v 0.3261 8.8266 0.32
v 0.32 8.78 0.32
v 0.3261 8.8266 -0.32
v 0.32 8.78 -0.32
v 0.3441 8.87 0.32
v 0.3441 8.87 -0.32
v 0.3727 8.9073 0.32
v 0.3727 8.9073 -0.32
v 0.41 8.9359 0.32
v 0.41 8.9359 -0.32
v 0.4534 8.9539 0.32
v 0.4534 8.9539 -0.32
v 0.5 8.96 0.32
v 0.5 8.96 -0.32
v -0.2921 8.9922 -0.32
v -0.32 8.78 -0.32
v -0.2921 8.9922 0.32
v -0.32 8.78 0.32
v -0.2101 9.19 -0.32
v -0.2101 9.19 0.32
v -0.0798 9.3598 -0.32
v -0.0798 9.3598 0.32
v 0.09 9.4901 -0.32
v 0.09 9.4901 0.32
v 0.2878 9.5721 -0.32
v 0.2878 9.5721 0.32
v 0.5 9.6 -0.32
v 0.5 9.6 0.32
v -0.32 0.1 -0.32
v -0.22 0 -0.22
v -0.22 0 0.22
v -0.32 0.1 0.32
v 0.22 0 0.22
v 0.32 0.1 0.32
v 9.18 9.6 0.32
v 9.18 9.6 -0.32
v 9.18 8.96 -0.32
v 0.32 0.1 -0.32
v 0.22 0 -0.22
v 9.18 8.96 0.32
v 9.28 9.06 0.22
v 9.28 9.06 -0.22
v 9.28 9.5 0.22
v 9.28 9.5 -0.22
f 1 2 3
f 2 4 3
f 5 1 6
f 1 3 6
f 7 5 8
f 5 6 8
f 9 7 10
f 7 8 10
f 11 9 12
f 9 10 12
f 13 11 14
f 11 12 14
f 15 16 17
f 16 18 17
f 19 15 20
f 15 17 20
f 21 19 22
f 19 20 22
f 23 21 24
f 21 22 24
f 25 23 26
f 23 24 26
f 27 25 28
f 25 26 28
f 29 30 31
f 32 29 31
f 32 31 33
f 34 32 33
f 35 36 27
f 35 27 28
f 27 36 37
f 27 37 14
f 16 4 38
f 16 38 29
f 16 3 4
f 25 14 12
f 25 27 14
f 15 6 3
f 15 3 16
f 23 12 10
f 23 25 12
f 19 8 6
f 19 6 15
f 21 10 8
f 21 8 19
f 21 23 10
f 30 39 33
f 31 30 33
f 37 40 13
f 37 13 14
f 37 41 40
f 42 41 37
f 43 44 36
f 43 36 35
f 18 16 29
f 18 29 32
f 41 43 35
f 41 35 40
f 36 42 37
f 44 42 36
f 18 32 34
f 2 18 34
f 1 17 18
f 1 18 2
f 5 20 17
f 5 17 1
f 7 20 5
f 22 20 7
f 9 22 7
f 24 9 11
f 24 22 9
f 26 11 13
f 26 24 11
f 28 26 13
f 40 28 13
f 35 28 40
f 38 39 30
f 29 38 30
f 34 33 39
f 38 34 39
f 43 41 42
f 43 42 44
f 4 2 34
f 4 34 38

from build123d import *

# Parameters (mm, degrees)
SKETCH_1_W     = 0.64
SKETCH_1_H     = 0.64
CHAMFER_1_SIZE = 0.1


with BuildPart() as part:
    # По траектории1: sweep along a path in Эскиз2
    with BuildLine(Plane.XY) as sweep_1_path:
        Line((0, 0), (0, 8.78))
        ThreePointArc((0, 8.78), (0.146446609, 9.133553391), (0.5, 9.28))
        Line((0.5, 9.28), (9.28, 9.28))
    # Эскиз1 → По траектории1 (sweep)
    with BuildSketch(Plane(origin=(0, 0, 0), x_dir=(1, 0, 0), z_dir=(0, 1, 0))):
        Rectangle(SKETCH_1_W, SKETCH_1_H)
    sweep(path=sweep_1_path.line)

    # Фаска1
    chamfer_1_edges = [part.edges().sort_by_distance(p)[0] for p in [
        (9.28, 8.96, 0),
        (9.28, 9.28, 0.32),
        (9.28, 9.6, 0),
        (9.28, 9.28, -0.32),
        (0, 0, 0.32),
        (-0.32, 0, 0),
        (0, 0, -0.32),
        (0.32, 0, 0),
    ]]
    chamfer(chamfer_1_edges, length=CHAMFER_1_SIZE)


solid = part.part
